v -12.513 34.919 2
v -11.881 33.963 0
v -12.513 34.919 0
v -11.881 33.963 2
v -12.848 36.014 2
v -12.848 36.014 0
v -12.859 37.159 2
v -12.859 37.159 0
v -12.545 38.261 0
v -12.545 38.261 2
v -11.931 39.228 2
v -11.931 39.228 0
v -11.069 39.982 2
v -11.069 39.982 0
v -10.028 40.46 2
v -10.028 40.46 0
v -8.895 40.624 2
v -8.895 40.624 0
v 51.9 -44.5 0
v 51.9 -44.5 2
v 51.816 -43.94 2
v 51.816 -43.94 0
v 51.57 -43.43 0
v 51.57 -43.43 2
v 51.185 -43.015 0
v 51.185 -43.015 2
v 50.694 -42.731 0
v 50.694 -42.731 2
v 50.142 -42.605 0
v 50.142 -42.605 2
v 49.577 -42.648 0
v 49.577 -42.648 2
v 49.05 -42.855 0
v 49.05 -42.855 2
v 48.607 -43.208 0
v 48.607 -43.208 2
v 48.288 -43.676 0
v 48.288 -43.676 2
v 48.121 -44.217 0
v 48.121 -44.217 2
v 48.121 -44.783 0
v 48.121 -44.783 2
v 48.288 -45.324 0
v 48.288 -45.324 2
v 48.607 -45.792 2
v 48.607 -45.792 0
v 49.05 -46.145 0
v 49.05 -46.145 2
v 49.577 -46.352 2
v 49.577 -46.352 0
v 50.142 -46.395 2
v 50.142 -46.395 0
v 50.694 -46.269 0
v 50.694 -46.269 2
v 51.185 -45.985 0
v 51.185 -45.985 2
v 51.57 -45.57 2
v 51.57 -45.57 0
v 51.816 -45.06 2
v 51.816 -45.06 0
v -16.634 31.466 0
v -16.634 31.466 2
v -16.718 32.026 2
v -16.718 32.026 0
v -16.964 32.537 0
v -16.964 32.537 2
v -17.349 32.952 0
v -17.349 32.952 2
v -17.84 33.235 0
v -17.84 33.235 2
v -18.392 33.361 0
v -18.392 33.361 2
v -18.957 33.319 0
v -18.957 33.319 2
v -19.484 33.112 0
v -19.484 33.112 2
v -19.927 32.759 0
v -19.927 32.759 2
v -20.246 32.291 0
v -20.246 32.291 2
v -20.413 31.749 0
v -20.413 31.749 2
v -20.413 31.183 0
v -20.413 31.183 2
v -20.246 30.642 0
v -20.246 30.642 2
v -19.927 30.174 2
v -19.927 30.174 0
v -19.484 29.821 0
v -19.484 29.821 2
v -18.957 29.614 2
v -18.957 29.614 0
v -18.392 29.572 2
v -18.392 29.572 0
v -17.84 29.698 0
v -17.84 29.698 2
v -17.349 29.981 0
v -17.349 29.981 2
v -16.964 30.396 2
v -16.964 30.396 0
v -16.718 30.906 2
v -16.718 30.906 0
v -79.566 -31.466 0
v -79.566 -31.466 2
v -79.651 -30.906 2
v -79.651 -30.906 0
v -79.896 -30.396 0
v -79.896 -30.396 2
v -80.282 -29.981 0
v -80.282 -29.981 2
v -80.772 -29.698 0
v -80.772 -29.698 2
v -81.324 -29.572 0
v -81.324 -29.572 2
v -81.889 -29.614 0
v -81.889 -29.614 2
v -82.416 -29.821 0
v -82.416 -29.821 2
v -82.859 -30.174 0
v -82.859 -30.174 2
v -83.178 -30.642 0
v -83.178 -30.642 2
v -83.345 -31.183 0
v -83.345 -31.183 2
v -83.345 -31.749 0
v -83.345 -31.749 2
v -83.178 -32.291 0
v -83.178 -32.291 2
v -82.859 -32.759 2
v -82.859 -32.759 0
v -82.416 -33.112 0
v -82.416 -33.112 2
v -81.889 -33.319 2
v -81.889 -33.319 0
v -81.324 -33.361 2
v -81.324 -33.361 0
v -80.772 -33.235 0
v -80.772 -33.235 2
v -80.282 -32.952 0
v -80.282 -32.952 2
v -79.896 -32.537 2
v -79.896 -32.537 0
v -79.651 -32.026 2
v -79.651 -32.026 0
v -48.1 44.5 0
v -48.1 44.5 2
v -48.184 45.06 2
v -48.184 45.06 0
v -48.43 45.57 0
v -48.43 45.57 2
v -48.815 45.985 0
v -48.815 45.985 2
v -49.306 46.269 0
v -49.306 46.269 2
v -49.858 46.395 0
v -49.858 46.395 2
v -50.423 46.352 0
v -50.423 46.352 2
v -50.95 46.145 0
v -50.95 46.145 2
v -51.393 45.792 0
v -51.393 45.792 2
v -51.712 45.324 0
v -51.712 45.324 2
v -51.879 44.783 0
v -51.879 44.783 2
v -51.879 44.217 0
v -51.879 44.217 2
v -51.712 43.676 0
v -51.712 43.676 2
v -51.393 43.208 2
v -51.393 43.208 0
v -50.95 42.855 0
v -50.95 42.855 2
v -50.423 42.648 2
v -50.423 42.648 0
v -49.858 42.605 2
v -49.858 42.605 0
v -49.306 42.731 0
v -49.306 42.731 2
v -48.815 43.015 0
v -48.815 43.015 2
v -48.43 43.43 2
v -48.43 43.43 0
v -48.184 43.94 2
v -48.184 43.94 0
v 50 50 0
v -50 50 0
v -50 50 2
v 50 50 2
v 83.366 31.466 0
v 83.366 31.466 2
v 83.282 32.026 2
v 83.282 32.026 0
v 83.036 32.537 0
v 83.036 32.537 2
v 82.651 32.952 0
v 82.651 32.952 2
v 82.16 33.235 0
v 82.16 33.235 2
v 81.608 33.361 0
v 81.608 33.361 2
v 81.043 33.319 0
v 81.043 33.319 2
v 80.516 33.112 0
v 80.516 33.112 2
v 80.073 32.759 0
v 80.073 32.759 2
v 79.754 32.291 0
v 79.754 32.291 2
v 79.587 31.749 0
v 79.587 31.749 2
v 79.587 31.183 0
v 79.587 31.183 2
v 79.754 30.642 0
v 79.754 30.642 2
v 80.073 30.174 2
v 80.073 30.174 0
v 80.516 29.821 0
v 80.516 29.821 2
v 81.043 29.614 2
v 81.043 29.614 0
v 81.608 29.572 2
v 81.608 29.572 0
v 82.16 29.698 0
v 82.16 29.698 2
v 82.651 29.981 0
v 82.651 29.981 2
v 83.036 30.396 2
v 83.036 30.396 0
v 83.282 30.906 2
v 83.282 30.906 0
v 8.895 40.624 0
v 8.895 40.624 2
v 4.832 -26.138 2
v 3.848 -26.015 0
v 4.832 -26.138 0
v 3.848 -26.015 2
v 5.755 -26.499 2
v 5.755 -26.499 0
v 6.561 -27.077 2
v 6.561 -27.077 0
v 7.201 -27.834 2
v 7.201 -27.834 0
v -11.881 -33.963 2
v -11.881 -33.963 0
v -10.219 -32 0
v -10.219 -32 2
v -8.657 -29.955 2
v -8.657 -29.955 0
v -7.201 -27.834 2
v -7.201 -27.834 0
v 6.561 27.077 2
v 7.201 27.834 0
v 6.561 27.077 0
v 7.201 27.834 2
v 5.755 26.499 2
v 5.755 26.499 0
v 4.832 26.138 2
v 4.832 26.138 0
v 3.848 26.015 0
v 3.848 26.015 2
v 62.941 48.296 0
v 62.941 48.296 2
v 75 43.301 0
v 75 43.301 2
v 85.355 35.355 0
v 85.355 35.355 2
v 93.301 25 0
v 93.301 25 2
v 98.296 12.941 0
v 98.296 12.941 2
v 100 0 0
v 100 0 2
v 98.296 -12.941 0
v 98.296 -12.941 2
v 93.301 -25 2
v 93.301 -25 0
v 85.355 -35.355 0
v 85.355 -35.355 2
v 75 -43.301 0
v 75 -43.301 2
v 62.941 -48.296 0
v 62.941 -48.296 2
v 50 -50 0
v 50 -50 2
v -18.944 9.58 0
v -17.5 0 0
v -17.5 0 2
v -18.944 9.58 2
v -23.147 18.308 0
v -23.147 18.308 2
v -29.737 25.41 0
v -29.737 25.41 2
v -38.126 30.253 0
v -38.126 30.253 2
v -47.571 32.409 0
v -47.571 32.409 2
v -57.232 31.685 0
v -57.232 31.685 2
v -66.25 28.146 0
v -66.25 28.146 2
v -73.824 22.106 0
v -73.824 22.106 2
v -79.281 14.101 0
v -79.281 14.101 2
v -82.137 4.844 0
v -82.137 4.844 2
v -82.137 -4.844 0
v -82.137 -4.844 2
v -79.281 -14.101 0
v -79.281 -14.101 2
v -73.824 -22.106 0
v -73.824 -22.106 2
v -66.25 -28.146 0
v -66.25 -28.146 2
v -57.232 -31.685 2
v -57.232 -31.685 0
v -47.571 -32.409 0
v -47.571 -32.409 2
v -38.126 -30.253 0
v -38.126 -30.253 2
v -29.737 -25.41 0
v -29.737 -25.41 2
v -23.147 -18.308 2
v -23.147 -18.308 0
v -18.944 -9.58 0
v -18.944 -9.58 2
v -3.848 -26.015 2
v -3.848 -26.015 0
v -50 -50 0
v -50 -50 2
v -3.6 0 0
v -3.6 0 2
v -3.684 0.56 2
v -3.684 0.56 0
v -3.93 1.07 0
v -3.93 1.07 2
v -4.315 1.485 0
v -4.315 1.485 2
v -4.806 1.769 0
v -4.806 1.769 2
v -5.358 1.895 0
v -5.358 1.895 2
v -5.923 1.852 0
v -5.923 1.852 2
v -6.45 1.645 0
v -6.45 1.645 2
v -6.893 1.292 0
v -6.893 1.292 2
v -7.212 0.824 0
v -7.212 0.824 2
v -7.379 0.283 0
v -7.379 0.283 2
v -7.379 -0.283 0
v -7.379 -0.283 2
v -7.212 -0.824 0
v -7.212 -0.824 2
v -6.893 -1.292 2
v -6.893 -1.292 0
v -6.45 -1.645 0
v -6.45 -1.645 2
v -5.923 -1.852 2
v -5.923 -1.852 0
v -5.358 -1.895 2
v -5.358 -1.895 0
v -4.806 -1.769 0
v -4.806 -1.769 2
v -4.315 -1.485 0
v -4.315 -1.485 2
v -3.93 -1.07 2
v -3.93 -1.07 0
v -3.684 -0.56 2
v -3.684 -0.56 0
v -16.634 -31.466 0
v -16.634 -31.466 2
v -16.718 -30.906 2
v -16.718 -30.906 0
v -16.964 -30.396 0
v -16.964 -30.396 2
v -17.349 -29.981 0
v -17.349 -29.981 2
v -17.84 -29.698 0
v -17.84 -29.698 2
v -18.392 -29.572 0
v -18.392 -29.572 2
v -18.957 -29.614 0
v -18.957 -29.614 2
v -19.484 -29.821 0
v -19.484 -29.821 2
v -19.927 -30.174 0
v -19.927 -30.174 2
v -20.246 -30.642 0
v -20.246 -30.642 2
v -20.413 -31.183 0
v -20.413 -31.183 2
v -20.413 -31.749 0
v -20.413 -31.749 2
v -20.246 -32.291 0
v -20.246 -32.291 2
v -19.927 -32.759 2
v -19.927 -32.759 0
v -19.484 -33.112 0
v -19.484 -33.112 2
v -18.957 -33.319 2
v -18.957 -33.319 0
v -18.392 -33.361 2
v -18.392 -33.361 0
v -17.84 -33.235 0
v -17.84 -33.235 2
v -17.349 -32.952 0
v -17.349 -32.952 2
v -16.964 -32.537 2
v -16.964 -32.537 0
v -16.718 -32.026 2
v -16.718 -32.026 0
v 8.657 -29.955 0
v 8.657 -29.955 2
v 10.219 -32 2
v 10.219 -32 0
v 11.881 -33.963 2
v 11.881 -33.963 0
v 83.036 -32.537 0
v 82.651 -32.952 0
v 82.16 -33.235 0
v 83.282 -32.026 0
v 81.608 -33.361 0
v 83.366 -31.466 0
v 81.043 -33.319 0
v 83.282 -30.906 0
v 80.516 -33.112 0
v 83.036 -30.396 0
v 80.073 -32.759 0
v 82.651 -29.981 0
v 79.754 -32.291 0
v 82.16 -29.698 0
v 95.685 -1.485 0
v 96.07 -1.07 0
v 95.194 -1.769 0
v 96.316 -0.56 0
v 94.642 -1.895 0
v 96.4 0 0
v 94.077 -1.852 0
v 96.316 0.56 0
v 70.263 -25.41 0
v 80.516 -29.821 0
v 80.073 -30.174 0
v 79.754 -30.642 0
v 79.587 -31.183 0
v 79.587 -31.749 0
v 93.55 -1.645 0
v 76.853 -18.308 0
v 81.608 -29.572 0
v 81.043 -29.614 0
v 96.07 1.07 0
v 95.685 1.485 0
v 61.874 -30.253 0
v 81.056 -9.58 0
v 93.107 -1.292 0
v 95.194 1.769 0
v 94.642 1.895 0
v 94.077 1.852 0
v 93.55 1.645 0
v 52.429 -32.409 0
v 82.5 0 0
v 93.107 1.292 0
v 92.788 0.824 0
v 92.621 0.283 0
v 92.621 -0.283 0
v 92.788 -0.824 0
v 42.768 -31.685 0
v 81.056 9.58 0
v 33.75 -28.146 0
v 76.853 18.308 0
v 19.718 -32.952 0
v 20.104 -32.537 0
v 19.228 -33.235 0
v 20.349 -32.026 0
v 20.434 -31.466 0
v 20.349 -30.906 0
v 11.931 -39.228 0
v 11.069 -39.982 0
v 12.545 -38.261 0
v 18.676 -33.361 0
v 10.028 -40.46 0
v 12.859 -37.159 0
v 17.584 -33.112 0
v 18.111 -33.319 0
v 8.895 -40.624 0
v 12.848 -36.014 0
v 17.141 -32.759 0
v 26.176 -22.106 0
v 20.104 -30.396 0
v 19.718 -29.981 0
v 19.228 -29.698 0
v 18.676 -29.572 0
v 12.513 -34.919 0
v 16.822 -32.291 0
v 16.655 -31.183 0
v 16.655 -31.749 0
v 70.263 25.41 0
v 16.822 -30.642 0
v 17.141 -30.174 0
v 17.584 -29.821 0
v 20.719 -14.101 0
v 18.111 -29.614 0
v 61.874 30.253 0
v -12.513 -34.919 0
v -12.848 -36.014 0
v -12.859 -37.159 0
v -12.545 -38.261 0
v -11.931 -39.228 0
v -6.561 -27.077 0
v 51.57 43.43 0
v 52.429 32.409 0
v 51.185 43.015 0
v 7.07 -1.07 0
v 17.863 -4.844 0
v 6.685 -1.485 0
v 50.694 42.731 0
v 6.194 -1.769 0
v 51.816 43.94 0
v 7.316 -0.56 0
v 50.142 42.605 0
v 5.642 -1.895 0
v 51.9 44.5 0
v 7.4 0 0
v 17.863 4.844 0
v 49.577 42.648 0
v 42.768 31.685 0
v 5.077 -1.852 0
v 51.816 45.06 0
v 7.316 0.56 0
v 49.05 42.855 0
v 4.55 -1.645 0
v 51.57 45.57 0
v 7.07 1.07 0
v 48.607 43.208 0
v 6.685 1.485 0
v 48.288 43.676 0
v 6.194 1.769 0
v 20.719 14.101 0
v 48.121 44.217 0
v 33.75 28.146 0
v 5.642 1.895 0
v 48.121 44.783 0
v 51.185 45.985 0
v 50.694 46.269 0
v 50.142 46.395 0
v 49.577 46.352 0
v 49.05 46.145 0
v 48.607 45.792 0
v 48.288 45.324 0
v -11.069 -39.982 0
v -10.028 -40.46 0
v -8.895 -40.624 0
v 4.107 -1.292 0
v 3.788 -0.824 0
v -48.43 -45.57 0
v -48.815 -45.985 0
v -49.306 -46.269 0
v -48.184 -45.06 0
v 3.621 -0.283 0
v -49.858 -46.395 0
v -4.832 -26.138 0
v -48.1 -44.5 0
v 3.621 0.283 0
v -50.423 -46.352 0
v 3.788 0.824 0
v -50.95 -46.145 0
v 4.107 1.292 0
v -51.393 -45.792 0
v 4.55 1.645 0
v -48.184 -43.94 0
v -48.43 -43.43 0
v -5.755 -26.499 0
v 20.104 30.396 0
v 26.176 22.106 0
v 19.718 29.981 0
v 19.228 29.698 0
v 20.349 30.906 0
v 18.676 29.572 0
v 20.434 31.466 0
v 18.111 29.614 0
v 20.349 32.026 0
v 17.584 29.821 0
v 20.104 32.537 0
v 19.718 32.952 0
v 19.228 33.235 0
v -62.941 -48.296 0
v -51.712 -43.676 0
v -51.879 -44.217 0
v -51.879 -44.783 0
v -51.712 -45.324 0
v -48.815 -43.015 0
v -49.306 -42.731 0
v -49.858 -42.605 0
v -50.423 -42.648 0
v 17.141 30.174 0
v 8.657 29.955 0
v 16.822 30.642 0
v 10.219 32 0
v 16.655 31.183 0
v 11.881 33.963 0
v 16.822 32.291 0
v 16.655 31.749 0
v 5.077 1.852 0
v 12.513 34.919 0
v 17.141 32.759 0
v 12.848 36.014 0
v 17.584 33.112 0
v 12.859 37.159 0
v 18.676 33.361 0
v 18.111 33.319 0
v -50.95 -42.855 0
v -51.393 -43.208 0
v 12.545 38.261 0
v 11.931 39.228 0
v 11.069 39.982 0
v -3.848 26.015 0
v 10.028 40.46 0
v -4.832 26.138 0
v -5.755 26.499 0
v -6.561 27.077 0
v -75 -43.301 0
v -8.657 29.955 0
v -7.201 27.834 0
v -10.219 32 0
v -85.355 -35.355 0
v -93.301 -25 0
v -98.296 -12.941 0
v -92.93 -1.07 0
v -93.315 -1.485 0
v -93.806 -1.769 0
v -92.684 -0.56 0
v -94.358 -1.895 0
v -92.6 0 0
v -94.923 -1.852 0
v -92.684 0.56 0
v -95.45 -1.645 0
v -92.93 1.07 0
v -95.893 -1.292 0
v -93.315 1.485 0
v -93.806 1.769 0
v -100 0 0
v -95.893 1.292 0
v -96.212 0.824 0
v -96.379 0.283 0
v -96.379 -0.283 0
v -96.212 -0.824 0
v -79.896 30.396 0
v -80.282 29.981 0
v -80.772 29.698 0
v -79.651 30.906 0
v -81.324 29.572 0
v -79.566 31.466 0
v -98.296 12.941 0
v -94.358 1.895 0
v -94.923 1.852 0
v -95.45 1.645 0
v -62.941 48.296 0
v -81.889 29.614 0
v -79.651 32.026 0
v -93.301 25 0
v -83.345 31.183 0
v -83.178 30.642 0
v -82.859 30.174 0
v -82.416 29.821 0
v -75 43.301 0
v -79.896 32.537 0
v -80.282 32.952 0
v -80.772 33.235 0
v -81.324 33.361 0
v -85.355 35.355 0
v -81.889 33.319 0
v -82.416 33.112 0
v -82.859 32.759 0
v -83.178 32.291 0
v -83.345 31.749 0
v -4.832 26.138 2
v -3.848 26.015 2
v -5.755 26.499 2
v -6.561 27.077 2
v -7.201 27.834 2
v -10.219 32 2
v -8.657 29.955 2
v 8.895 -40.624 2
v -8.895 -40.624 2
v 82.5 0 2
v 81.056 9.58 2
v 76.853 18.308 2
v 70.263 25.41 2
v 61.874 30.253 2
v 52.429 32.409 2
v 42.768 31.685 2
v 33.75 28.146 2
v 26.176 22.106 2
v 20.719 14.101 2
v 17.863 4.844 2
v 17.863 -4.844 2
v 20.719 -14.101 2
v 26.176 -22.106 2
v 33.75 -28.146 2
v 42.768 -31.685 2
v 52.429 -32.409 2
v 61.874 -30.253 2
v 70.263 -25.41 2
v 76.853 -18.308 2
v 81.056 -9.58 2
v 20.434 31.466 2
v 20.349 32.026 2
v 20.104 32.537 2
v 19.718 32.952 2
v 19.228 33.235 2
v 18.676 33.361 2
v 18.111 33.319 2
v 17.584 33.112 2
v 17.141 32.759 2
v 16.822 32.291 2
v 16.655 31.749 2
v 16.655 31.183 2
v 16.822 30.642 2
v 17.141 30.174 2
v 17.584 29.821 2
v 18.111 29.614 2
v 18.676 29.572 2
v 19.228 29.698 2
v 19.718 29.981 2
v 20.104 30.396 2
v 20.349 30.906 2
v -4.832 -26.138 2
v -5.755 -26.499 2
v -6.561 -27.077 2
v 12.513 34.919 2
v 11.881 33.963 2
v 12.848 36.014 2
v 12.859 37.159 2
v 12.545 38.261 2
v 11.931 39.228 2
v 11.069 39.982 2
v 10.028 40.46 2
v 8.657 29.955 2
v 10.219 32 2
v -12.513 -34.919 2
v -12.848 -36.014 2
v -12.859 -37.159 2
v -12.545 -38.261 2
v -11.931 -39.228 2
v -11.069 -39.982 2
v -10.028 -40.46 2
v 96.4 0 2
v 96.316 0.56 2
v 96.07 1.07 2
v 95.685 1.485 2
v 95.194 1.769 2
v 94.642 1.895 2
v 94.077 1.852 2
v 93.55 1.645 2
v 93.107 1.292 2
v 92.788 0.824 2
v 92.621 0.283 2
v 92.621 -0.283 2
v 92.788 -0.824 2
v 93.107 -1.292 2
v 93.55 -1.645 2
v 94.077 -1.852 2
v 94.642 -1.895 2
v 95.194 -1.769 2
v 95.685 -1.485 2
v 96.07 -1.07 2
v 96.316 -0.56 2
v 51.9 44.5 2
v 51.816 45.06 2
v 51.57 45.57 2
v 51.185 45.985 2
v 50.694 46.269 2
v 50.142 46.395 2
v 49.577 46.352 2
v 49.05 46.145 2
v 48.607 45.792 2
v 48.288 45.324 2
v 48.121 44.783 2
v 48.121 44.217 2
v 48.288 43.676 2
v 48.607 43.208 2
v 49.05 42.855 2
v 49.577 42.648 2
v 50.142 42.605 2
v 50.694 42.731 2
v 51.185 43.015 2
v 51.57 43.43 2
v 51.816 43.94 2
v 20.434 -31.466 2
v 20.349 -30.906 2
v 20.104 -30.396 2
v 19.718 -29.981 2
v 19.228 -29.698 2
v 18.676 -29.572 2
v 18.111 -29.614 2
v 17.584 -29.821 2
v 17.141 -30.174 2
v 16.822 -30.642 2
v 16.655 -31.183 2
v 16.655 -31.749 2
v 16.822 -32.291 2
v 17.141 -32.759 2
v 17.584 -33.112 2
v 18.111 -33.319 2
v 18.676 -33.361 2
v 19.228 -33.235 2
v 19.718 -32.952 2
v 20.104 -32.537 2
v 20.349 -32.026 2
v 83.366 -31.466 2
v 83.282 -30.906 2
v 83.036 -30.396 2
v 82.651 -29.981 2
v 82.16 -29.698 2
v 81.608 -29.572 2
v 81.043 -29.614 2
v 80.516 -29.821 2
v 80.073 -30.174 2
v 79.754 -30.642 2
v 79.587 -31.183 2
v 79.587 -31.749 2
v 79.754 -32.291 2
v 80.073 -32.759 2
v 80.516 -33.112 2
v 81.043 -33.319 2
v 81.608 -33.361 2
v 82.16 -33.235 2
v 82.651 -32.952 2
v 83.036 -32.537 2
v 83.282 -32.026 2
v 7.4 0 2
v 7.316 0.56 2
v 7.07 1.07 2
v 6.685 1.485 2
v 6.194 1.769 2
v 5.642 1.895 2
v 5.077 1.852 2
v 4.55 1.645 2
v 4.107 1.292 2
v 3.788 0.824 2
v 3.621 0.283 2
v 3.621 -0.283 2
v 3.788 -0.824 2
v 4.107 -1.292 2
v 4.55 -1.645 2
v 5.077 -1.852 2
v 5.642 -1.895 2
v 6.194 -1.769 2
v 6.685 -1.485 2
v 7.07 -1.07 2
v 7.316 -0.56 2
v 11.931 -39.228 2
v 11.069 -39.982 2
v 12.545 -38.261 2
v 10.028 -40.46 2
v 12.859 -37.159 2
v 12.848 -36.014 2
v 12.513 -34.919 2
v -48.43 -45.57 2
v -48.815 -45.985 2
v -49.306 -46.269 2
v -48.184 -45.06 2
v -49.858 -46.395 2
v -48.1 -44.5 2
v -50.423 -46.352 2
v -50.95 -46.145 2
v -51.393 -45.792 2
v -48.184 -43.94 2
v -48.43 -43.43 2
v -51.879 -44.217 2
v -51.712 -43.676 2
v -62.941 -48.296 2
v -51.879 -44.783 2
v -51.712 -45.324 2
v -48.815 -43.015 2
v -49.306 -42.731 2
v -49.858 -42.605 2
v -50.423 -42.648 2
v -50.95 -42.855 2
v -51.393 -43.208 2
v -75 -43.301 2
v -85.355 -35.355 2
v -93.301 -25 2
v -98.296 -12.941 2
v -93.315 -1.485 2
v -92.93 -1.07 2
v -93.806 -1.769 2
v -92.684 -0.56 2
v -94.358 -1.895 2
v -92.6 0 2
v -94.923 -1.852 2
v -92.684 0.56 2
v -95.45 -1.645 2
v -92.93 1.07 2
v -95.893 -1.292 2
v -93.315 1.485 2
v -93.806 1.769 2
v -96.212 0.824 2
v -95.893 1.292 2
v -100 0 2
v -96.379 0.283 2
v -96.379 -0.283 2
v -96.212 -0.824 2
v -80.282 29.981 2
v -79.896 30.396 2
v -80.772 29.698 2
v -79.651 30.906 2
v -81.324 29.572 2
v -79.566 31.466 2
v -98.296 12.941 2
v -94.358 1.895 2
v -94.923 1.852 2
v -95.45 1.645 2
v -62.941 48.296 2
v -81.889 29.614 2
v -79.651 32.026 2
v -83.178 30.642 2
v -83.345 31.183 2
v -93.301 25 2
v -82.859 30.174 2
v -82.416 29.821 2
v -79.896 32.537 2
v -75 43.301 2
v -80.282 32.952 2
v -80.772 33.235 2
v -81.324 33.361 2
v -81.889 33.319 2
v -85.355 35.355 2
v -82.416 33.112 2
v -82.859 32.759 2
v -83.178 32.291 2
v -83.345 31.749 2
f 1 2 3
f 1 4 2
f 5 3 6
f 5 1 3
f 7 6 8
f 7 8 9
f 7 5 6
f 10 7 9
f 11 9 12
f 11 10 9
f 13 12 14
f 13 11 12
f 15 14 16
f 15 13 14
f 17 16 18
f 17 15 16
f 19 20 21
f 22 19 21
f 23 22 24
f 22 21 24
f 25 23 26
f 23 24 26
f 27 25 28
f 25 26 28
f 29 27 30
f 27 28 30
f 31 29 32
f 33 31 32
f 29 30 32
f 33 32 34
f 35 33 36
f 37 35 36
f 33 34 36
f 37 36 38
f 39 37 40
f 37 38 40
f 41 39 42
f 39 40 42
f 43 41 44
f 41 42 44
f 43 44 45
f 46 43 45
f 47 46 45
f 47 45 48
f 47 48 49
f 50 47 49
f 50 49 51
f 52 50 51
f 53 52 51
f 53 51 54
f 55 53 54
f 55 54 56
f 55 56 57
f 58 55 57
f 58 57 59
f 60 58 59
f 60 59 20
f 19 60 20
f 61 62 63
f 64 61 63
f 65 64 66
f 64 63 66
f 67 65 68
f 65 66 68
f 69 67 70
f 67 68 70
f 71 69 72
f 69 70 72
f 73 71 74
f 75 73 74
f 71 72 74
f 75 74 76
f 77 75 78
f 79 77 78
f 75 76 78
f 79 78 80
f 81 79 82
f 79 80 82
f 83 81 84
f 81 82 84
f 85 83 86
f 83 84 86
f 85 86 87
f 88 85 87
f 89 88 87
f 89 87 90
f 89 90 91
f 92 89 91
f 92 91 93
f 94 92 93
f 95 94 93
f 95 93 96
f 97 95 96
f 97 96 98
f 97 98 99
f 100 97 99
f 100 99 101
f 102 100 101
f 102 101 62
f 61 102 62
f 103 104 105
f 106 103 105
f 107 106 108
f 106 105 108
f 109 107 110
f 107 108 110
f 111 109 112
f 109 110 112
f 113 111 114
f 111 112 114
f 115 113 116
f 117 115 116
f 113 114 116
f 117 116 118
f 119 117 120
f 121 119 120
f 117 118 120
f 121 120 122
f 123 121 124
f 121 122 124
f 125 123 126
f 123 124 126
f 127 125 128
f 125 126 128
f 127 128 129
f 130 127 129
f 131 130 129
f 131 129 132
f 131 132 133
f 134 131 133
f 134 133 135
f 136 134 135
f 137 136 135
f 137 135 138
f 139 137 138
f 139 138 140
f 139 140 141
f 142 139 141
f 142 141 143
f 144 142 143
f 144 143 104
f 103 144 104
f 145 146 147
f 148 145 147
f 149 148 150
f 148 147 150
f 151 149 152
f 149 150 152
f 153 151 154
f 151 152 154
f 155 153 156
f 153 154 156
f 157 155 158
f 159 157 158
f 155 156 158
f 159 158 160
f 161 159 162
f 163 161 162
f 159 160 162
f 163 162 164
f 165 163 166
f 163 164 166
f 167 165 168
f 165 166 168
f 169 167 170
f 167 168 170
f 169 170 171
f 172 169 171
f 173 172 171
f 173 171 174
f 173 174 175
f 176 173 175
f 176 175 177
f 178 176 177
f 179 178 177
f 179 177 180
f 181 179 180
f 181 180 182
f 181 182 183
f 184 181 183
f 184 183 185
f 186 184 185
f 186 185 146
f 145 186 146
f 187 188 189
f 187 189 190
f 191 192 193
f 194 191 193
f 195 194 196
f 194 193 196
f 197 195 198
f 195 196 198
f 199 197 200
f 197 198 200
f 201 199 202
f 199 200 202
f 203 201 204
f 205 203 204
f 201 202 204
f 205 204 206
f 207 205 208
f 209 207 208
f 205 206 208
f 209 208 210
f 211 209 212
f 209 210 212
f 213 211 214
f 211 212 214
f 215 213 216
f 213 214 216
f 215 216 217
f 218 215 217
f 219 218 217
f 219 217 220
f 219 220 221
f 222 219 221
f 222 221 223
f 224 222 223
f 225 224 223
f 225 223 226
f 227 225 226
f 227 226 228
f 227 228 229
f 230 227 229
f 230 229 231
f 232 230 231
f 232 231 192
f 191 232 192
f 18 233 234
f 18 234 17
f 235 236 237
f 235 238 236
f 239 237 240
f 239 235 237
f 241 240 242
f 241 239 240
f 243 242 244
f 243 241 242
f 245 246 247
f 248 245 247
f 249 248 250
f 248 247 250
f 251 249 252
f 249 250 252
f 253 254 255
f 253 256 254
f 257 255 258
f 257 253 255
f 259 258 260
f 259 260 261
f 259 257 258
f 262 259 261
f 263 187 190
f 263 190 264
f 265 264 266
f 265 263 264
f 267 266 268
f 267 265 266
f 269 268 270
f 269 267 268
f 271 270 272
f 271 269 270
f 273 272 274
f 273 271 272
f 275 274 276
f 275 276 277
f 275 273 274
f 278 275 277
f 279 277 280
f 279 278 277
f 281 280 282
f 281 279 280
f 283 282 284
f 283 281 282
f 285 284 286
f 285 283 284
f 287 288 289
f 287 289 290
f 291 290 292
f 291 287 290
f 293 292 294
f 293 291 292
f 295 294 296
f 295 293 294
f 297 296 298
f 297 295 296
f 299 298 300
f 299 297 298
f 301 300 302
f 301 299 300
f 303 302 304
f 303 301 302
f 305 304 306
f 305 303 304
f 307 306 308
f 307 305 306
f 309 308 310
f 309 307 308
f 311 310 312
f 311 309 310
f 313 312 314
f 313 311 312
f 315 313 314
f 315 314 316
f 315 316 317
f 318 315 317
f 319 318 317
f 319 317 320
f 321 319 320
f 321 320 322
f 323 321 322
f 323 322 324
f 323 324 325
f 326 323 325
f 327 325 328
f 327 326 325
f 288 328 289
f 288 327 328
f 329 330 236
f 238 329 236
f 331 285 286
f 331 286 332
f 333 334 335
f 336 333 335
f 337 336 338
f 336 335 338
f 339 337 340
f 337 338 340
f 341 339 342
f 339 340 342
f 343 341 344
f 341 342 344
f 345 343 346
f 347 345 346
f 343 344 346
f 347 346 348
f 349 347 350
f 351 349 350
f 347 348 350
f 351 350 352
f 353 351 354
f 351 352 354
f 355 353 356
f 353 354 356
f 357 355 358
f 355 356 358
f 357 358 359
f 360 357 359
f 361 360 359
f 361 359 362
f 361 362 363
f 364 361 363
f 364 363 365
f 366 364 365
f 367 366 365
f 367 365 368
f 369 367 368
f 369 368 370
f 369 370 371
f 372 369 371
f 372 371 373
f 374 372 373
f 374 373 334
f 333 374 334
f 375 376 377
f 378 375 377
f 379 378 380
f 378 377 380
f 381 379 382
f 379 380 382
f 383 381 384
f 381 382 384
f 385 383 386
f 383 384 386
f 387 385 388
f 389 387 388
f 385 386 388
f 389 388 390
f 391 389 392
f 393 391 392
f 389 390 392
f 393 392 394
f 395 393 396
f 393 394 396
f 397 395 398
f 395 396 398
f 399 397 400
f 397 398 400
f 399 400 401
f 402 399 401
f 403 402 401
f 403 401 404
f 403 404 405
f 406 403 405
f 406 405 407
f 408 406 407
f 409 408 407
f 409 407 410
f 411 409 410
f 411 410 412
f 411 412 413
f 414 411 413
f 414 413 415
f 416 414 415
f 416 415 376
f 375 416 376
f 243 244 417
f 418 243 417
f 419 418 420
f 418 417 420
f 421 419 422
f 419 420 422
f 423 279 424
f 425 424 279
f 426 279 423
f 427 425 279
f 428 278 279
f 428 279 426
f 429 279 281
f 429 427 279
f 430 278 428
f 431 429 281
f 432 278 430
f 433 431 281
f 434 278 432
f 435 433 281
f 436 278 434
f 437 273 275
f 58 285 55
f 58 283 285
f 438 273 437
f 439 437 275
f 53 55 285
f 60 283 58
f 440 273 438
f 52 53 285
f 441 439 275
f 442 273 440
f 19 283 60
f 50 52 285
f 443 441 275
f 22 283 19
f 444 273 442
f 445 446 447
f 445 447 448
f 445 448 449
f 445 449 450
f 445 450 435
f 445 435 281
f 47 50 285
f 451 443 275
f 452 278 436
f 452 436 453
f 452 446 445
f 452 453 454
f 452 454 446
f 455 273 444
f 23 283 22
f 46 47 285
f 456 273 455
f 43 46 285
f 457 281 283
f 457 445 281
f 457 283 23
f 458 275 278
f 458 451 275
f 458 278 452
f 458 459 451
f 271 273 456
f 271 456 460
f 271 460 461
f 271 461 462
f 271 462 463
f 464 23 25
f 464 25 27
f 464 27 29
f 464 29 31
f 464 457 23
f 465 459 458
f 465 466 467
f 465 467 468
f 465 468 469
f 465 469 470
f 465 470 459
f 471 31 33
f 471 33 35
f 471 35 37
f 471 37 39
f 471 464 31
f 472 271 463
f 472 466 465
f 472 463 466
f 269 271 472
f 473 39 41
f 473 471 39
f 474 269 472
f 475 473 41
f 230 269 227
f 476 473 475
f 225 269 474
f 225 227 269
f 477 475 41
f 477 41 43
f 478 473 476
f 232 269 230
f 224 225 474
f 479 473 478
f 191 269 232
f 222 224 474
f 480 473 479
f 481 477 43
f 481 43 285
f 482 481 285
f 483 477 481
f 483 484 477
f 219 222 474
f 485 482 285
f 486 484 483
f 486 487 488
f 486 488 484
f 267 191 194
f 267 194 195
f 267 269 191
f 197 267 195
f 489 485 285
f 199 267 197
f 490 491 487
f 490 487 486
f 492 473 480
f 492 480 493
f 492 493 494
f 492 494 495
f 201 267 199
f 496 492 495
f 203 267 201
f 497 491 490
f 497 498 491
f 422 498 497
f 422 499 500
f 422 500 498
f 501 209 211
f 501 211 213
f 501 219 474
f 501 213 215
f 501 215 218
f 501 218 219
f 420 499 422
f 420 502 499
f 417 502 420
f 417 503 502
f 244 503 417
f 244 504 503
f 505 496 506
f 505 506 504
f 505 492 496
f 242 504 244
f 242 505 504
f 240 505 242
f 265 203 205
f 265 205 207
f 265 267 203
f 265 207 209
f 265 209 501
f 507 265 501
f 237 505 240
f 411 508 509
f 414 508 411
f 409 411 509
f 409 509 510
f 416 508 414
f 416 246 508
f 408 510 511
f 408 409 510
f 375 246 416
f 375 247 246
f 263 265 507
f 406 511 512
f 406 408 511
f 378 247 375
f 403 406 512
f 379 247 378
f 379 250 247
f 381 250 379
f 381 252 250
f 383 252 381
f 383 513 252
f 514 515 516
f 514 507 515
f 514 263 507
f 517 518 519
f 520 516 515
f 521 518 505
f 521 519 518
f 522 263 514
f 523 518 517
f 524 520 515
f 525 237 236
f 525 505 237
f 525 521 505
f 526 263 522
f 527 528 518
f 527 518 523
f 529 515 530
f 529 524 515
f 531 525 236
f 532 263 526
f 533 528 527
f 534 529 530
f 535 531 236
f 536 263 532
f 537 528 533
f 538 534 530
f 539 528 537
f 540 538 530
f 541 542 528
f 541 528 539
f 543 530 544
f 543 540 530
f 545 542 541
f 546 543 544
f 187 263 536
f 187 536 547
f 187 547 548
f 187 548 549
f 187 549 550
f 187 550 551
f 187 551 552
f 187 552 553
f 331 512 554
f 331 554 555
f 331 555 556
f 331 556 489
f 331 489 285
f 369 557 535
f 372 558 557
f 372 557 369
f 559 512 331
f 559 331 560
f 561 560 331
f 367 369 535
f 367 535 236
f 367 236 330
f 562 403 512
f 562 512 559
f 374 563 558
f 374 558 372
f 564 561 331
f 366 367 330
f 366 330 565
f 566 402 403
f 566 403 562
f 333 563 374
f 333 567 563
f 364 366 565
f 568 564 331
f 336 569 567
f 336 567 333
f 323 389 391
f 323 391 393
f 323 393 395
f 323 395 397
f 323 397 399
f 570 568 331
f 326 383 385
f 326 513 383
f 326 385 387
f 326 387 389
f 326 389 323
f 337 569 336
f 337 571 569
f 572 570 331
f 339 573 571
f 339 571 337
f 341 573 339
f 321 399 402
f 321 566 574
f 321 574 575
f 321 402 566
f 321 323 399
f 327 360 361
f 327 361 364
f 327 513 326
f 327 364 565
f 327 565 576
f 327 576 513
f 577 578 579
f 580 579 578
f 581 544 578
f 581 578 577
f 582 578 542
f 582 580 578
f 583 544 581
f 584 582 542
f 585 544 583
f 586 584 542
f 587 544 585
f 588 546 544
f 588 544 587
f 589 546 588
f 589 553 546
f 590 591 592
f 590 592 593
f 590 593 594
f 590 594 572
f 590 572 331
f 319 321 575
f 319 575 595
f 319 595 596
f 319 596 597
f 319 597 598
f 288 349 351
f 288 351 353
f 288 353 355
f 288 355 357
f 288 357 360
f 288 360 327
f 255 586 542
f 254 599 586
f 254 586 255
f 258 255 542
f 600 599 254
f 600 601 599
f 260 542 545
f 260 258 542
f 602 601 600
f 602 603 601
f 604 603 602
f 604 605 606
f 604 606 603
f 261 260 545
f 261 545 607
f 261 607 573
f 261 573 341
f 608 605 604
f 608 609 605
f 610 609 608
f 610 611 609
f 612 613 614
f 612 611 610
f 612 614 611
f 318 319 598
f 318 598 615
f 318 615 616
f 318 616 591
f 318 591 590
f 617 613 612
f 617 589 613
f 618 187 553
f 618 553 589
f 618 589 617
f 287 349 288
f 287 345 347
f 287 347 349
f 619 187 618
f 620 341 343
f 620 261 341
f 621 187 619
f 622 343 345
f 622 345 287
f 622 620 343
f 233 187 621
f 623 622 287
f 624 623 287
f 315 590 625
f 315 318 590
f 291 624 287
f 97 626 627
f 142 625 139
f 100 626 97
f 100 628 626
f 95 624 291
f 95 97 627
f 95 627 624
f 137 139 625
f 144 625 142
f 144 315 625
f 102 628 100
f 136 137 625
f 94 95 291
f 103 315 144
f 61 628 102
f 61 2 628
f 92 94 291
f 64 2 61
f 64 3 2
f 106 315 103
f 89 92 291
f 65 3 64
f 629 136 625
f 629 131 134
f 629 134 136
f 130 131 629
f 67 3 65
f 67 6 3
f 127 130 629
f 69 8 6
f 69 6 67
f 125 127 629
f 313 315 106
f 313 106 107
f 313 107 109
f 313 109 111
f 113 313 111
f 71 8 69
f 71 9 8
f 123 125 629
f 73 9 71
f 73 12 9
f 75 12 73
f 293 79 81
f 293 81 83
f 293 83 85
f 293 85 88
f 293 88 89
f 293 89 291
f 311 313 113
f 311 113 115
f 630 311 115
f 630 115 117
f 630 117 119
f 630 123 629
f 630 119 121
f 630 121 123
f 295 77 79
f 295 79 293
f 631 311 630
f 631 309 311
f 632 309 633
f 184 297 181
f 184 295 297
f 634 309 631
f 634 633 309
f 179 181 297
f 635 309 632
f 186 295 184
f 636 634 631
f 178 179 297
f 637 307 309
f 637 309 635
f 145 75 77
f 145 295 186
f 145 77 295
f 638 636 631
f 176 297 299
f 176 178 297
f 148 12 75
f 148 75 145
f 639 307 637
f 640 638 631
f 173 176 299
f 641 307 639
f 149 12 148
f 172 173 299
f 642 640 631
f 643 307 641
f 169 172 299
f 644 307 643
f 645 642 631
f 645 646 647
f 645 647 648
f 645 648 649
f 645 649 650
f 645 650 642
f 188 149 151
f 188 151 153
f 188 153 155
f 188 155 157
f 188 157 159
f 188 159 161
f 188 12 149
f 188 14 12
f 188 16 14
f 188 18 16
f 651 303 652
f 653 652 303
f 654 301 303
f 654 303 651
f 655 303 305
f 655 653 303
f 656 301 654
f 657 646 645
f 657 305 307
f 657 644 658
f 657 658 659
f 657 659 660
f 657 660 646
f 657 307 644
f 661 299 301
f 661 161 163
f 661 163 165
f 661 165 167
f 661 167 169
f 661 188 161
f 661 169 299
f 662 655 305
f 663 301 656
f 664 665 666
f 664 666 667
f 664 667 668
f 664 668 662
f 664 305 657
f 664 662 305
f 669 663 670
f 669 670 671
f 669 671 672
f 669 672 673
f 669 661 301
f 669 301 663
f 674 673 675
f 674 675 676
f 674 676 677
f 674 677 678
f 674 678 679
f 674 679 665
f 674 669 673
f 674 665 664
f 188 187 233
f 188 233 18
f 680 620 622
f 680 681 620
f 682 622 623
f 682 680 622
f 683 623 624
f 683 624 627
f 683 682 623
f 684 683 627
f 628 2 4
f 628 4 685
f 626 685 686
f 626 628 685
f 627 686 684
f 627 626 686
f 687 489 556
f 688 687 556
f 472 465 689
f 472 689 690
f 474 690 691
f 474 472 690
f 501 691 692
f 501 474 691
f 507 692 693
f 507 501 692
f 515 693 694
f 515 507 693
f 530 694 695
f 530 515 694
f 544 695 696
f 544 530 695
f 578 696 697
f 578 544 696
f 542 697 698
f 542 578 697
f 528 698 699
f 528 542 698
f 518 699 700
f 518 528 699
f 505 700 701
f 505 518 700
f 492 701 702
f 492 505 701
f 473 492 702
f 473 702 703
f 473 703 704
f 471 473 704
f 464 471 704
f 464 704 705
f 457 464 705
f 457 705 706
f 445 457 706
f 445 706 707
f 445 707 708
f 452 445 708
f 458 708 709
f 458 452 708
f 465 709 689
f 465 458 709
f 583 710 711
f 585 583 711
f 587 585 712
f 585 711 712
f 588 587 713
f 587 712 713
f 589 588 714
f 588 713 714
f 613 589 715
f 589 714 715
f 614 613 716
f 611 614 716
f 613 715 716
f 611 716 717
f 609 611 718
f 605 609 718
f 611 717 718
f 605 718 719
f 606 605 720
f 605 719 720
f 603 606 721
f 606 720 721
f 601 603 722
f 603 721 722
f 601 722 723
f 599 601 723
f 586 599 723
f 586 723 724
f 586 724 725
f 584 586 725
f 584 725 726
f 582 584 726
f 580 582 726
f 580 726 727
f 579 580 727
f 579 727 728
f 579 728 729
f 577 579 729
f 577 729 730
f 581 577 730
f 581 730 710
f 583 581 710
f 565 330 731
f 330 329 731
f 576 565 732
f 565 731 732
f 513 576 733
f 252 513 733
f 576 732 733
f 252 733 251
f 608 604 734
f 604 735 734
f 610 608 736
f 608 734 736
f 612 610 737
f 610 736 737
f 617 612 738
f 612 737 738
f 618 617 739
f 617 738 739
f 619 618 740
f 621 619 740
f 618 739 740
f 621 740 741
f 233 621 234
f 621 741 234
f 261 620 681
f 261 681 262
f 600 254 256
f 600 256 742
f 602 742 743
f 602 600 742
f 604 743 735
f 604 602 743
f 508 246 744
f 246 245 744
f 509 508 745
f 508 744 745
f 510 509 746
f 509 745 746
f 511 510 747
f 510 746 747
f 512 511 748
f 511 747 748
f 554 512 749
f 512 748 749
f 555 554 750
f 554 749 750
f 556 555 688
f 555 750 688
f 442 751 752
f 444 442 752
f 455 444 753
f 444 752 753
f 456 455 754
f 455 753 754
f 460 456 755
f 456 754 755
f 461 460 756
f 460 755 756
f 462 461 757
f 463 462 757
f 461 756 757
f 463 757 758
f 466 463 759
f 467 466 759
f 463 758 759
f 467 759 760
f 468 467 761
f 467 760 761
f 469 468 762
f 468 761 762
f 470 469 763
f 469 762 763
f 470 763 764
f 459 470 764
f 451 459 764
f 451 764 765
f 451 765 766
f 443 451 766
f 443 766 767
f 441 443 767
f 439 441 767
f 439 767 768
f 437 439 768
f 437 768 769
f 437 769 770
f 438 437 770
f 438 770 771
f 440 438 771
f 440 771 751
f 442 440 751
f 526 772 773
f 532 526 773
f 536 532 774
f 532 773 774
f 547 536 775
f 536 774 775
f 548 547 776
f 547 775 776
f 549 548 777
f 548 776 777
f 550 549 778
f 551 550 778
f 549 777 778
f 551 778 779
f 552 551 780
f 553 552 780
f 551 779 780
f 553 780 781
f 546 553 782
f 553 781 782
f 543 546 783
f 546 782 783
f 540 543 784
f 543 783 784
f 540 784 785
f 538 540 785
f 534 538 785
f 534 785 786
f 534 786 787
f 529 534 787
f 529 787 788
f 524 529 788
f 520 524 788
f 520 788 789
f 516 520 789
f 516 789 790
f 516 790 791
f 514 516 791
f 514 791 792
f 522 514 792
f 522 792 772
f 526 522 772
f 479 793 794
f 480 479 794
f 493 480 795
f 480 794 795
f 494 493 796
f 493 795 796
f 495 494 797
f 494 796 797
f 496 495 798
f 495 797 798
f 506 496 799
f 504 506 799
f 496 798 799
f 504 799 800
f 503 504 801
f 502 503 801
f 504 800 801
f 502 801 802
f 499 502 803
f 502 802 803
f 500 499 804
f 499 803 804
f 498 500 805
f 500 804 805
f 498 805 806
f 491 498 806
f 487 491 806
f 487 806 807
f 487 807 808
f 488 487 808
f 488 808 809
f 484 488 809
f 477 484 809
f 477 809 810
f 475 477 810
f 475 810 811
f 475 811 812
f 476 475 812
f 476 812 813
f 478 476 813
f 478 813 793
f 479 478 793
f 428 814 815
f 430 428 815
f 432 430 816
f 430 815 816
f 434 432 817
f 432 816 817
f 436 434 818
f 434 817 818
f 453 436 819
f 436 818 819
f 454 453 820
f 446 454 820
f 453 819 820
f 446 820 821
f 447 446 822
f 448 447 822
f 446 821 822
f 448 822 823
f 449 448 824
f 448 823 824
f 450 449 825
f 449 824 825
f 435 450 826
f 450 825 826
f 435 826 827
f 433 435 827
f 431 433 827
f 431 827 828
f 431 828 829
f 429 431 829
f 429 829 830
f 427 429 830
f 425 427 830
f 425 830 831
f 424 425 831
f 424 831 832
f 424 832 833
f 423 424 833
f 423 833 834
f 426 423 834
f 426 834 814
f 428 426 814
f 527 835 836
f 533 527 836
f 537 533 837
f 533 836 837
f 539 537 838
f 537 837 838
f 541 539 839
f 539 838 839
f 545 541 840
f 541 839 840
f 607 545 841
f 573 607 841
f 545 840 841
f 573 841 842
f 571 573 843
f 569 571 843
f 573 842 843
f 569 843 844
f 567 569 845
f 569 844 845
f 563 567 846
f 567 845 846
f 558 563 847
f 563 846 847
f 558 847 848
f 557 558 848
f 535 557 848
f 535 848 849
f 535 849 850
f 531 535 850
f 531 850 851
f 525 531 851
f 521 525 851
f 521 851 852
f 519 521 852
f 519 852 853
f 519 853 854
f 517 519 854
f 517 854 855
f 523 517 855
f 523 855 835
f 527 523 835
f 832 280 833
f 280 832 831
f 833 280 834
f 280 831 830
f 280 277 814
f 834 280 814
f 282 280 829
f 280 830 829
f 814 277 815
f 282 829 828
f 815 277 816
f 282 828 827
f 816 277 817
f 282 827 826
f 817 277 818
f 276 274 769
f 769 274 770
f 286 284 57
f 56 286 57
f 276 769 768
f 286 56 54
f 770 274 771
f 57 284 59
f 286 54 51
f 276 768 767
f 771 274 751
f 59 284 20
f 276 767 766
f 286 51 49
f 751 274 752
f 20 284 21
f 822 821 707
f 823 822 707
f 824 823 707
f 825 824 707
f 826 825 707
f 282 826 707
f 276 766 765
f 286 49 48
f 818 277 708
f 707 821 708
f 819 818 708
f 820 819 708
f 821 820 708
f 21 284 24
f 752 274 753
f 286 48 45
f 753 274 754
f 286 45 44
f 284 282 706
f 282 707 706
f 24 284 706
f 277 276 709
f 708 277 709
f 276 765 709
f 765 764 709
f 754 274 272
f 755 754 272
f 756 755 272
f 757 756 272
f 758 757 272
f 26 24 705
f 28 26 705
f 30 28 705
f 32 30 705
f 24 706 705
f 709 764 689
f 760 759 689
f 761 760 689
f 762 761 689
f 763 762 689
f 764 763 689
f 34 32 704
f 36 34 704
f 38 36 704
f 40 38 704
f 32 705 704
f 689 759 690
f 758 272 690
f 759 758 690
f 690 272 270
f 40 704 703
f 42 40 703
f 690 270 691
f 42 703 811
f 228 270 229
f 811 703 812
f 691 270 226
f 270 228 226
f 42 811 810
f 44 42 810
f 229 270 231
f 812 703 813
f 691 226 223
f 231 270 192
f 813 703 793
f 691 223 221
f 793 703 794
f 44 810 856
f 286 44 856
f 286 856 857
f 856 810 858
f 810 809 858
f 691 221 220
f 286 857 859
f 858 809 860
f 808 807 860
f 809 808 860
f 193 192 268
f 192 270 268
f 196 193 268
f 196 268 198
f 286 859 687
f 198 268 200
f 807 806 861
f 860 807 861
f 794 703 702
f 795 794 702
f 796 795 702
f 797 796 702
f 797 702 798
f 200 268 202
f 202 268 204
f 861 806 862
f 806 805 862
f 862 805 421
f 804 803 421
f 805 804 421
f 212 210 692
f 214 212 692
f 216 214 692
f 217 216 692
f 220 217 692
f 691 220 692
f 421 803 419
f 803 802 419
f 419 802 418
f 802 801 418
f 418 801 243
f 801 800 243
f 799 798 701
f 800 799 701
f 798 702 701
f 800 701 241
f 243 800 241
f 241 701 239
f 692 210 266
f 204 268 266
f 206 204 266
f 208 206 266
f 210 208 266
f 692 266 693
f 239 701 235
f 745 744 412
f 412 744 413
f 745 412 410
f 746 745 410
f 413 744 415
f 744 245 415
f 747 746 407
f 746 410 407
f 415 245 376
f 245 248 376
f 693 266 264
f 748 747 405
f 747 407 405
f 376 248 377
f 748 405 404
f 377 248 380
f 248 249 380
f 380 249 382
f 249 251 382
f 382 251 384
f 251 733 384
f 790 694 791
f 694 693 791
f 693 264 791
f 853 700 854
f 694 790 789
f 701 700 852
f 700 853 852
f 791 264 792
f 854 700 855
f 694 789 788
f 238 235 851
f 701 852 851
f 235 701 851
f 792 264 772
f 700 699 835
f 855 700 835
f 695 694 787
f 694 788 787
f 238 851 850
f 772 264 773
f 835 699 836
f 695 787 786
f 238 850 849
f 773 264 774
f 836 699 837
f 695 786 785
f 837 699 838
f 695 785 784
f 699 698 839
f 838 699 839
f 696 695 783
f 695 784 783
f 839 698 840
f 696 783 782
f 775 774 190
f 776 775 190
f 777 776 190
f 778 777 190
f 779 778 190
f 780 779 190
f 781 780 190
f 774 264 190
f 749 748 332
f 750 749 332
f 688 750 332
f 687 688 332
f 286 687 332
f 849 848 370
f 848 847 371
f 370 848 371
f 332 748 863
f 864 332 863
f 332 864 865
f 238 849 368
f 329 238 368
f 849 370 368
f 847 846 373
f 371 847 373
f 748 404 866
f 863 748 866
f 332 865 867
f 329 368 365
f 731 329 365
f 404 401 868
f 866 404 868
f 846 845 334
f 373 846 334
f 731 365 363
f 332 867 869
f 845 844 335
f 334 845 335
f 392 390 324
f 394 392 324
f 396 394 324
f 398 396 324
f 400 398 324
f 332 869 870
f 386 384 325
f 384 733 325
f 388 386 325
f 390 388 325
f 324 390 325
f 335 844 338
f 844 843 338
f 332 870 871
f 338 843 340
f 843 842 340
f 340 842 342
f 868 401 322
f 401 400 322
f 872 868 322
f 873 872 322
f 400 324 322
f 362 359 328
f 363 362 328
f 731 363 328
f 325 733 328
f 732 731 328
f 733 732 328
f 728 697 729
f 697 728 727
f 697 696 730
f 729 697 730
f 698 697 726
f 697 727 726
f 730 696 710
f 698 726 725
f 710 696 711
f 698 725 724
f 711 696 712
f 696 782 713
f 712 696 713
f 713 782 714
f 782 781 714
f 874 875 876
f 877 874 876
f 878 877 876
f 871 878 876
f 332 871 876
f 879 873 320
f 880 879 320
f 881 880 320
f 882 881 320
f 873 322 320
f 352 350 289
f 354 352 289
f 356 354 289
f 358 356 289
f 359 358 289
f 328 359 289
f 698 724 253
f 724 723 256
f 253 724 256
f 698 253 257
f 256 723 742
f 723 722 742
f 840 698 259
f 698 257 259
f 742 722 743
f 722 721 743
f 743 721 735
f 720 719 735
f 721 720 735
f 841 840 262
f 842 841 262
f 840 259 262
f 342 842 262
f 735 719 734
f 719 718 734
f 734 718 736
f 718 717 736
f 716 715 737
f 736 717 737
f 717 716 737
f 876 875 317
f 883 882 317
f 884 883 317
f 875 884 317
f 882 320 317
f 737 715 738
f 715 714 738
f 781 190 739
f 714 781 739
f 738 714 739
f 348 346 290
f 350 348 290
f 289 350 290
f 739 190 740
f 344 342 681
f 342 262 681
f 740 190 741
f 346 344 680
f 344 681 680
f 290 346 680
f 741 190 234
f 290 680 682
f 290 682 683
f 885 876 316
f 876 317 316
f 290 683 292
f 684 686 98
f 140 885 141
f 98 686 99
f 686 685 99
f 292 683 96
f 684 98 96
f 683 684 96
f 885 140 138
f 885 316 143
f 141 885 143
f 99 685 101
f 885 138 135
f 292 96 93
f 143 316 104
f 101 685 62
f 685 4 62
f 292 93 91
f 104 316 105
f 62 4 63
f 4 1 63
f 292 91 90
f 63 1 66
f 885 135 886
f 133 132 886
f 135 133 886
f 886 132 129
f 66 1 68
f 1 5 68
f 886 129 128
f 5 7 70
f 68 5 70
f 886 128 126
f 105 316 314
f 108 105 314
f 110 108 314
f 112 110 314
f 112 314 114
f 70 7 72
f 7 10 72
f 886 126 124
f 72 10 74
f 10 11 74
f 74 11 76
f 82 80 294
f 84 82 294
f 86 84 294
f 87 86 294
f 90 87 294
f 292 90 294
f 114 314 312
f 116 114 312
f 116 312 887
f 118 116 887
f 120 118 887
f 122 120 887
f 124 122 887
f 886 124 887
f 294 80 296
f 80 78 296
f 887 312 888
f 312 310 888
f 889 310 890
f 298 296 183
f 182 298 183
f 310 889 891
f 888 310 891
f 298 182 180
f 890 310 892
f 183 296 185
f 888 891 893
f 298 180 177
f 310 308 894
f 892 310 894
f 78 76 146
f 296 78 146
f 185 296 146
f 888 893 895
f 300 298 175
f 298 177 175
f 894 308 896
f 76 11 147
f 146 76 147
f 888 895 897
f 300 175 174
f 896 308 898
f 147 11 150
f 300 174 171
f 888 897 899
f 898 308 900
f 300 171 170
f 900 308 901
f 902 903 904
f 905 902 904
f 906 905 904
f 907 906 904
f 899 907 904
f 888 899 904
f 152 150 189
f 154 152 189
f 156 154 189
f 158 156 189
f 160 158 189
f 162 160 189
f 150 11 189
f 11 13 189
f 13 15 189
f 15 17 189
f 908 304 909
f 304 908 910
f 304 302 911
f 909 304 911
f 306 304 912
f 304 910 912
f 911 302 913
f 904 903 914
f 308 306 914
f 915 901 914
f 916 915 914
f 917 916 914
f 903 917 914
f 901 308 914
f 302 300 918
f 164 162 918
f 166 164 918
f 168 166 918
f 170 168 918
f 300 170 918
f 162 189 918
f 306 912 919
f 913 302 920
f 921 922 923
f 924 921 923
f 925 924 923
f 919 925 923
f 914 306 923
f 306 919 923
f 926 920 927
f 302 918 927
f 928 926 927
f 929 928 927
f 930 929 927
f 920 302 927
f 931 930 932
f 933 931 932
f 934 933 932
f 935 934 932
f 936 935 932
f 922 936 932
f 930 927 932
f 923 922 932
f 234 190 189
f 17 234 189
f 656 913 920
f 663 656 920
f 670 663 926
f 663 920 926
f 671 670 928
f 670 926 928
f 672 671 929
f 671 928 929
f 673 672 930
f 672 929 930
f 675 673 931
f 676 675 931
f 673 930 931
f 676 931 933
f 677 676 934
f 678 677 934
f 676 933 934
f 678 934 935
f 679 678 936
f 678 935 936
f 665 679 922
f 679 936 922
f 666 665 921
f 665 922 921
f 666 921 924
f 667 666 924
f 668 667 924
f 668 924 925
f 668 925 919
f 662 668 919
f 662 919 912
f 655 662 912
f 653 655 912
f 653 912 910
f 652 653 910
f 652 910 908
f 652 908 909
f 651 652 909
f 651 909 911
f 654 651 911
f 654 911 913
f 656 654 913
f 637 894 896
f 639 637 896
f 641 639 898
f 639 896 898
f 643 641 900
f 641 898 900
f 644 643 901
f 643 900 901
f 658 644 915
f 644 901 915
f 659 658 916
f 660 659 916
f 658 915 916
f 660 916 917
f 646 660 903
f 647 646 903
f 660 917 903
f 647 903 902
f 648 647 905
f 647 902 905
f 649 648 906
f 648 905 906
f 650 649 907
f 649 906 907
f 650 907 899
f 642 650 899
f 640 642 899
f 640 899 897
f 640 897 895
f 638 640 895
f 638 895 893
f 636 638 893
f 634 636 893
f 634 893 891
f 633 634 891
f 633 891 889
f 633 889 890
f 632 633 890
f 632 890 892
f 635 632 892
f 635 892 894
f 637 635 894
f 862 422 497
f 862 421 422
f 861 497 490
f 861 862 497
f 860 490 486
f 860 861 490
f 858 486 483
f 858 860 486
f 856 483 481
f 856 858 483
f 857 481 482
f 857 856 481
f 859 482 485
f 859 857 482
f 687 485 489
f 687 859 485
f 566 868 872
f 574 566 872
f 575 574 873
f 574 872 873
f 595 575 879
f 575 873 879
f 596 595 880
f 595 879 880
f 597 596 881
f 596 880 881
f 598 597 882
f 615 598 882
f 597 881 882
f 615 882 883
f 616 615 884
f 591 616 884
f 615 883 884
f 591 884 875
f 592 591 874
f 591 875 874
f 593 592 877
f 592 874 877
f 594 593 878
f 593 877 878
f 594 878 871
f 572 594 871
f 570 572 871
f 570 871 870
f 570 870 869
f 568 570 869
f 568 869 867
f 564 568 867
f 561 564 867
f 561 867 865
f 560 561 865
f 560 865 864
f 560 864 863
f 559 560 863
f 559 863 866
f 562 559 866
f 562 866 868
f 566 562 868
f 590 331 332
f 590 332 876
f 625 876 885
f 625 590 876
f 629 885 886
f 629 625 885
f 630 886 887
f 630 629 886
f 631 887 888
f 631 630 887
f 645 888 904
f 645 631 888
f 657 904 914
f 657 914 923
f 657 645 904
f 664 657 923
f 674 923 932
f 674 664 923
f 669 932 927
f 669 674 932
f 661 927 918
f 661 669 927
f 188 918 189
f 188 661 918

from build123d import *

# Parameters (mm, degrees)
SKETCH_1_R          = 32.5
EXTRUDE_1_DEPTH     = 2
FILLET_1_R          = 4
SKETCH_2_R          = 1.9
CUT_EXTRUDE_1_DEPTH = 10


with BuildPart() as part:
    # 草图1 → 凸台-拉伸1 (new body)
    with BuildSketch(Plane.XY):
        with BuildLine():
            Line((-50, 50), (-25, 50))
            Line((-25, 50), (25, 50))
            Line((25, 50), (50, 50))
            ThreePointArc((50, 50), (100, 0), (50, -50))
            Line((50, -50), (25, -50))
            Line((25, -50), (-25, -50))
            Line((-25, -50), (-50, -50))
            ThreePointArc((-50, -50), (-100, 0), (-50, 50))
        make_face()
        with Locations((-50, 0)):
            Circle(SKETCH_1_R, mode=Mode.SUBTRACT)
        with Locations((50, 0)):
            Circle(SKETCH_1_R, mode=Mode.SUBTRACT)
        with BuildLine():
            Line((-6.07127469, -26.015246236), (6.07127469, -26.015246236))
            ThreePointArc((6.07127469, -26.015246236), (11.868149575, -33.948312584), (19.077305008, -40.624043109))
            Line((19.077305008, -40.624043109), (-19.077305008, -40.624043109))
            ThreePointArc((-19.077305008, -40.624043109), (-11.868149575, -33.948312584), (-6.07127469, -26.015246236))
        make_face(mode=Mode.SUBTRACT)
        with BuildLine():
            Line((19.077305008, 40.624043109), (-19.077305008, 40.624043109))
            ThreePointArc((-19.077305008, 40.624043109), (-11.868149575, 33.948312584), (-6.07127469, 26.015246236))
            Line((-6.07127469, 26.015246236), (6.07127469, 26.015246236))
            ThreePointArc((6.07127469, 26.015246236), (11.868149575, 33.948312584), (19.077305008, 40.624043109))
        make_face(mode=Mode.SUBTRACT)
    extrude(amount=EXTRUDE_1_DEPTH)

    # 圆角1
    fillet_1_edges = [part.edges().sort_by_distance(p)[0] for p in [
        (-6.07127469, -26.015246236, 1),
        (-19.077305008, -40.624043109, 1),
        (19.077305008, -40.624043109, 1),
        (6.07127469, -26.015246236, 1),
        (6.07127469, 26.015246236, 1),
        (19.077305008, 40.624043109, 1),
        (-19.077305008, 40.624043109, 1),
        (-6.07127469, 26.015246236, 1),
    ]]
    fillet(fillet_1_edges, radius=FILLET_1_R)

    # 草图2 → 切除-拉伸1 (cut)
    with BuildSketch(Plane.XY.offset(2)):
        with Locations((94.5, 0)):
            Circle(SKETCH_2_R)
        with Locations((81.466251763, -31.466251763)):
            Circle(SKETCH_2_R)
        with Locations((50, -44.5)):
            Circle(SKETCH_2_R)
        with Locations((18.533748237, -31.466251763)):
            Circle(SKETCH_2_R)
        with Locations((5.5, 0)):
            Circle(SKETCH_2_R)
        with Locations((18.533748237, 31.466251763)):
            Circle(SKETCH_2_R)
        with Locations((50, 44.5)):
            Circle(SKETCH_2_R)
        with Locations((81.466251763, 31.466251763)):
            Circle(SKETCH_2_R)
        with Locations((-81.466251763, 31.466251763)):
            Circle(SKETCH_2_R)
        with Locations((-50, 44.5)):
            Circle(SKETCH_2_R)
        with Locations((-18.533748237, 31.466251763)):
            Circle(SKETCH_2_R)
        with Locations((-5.5, 0)):
            Circle(SKETCH_2_R)
        with Locations((-18.533748237, -31.466251763)):
            Circle(SKETCH_2_R)
        with Locations((-50, -44.5)):
            Circle(SKETCH_2_R)
        with Locations((-81.466251763, -31.466251763)):
            Circle(SKETCH_2_R)
        with Locations((-94.5, 0)):
            Circle(SKETCH_2_R)
    extrude(amount=-CUT_EXTRUDE_1_DEPTH, mode=Mode.SUBTRACT)


solid = part.part
